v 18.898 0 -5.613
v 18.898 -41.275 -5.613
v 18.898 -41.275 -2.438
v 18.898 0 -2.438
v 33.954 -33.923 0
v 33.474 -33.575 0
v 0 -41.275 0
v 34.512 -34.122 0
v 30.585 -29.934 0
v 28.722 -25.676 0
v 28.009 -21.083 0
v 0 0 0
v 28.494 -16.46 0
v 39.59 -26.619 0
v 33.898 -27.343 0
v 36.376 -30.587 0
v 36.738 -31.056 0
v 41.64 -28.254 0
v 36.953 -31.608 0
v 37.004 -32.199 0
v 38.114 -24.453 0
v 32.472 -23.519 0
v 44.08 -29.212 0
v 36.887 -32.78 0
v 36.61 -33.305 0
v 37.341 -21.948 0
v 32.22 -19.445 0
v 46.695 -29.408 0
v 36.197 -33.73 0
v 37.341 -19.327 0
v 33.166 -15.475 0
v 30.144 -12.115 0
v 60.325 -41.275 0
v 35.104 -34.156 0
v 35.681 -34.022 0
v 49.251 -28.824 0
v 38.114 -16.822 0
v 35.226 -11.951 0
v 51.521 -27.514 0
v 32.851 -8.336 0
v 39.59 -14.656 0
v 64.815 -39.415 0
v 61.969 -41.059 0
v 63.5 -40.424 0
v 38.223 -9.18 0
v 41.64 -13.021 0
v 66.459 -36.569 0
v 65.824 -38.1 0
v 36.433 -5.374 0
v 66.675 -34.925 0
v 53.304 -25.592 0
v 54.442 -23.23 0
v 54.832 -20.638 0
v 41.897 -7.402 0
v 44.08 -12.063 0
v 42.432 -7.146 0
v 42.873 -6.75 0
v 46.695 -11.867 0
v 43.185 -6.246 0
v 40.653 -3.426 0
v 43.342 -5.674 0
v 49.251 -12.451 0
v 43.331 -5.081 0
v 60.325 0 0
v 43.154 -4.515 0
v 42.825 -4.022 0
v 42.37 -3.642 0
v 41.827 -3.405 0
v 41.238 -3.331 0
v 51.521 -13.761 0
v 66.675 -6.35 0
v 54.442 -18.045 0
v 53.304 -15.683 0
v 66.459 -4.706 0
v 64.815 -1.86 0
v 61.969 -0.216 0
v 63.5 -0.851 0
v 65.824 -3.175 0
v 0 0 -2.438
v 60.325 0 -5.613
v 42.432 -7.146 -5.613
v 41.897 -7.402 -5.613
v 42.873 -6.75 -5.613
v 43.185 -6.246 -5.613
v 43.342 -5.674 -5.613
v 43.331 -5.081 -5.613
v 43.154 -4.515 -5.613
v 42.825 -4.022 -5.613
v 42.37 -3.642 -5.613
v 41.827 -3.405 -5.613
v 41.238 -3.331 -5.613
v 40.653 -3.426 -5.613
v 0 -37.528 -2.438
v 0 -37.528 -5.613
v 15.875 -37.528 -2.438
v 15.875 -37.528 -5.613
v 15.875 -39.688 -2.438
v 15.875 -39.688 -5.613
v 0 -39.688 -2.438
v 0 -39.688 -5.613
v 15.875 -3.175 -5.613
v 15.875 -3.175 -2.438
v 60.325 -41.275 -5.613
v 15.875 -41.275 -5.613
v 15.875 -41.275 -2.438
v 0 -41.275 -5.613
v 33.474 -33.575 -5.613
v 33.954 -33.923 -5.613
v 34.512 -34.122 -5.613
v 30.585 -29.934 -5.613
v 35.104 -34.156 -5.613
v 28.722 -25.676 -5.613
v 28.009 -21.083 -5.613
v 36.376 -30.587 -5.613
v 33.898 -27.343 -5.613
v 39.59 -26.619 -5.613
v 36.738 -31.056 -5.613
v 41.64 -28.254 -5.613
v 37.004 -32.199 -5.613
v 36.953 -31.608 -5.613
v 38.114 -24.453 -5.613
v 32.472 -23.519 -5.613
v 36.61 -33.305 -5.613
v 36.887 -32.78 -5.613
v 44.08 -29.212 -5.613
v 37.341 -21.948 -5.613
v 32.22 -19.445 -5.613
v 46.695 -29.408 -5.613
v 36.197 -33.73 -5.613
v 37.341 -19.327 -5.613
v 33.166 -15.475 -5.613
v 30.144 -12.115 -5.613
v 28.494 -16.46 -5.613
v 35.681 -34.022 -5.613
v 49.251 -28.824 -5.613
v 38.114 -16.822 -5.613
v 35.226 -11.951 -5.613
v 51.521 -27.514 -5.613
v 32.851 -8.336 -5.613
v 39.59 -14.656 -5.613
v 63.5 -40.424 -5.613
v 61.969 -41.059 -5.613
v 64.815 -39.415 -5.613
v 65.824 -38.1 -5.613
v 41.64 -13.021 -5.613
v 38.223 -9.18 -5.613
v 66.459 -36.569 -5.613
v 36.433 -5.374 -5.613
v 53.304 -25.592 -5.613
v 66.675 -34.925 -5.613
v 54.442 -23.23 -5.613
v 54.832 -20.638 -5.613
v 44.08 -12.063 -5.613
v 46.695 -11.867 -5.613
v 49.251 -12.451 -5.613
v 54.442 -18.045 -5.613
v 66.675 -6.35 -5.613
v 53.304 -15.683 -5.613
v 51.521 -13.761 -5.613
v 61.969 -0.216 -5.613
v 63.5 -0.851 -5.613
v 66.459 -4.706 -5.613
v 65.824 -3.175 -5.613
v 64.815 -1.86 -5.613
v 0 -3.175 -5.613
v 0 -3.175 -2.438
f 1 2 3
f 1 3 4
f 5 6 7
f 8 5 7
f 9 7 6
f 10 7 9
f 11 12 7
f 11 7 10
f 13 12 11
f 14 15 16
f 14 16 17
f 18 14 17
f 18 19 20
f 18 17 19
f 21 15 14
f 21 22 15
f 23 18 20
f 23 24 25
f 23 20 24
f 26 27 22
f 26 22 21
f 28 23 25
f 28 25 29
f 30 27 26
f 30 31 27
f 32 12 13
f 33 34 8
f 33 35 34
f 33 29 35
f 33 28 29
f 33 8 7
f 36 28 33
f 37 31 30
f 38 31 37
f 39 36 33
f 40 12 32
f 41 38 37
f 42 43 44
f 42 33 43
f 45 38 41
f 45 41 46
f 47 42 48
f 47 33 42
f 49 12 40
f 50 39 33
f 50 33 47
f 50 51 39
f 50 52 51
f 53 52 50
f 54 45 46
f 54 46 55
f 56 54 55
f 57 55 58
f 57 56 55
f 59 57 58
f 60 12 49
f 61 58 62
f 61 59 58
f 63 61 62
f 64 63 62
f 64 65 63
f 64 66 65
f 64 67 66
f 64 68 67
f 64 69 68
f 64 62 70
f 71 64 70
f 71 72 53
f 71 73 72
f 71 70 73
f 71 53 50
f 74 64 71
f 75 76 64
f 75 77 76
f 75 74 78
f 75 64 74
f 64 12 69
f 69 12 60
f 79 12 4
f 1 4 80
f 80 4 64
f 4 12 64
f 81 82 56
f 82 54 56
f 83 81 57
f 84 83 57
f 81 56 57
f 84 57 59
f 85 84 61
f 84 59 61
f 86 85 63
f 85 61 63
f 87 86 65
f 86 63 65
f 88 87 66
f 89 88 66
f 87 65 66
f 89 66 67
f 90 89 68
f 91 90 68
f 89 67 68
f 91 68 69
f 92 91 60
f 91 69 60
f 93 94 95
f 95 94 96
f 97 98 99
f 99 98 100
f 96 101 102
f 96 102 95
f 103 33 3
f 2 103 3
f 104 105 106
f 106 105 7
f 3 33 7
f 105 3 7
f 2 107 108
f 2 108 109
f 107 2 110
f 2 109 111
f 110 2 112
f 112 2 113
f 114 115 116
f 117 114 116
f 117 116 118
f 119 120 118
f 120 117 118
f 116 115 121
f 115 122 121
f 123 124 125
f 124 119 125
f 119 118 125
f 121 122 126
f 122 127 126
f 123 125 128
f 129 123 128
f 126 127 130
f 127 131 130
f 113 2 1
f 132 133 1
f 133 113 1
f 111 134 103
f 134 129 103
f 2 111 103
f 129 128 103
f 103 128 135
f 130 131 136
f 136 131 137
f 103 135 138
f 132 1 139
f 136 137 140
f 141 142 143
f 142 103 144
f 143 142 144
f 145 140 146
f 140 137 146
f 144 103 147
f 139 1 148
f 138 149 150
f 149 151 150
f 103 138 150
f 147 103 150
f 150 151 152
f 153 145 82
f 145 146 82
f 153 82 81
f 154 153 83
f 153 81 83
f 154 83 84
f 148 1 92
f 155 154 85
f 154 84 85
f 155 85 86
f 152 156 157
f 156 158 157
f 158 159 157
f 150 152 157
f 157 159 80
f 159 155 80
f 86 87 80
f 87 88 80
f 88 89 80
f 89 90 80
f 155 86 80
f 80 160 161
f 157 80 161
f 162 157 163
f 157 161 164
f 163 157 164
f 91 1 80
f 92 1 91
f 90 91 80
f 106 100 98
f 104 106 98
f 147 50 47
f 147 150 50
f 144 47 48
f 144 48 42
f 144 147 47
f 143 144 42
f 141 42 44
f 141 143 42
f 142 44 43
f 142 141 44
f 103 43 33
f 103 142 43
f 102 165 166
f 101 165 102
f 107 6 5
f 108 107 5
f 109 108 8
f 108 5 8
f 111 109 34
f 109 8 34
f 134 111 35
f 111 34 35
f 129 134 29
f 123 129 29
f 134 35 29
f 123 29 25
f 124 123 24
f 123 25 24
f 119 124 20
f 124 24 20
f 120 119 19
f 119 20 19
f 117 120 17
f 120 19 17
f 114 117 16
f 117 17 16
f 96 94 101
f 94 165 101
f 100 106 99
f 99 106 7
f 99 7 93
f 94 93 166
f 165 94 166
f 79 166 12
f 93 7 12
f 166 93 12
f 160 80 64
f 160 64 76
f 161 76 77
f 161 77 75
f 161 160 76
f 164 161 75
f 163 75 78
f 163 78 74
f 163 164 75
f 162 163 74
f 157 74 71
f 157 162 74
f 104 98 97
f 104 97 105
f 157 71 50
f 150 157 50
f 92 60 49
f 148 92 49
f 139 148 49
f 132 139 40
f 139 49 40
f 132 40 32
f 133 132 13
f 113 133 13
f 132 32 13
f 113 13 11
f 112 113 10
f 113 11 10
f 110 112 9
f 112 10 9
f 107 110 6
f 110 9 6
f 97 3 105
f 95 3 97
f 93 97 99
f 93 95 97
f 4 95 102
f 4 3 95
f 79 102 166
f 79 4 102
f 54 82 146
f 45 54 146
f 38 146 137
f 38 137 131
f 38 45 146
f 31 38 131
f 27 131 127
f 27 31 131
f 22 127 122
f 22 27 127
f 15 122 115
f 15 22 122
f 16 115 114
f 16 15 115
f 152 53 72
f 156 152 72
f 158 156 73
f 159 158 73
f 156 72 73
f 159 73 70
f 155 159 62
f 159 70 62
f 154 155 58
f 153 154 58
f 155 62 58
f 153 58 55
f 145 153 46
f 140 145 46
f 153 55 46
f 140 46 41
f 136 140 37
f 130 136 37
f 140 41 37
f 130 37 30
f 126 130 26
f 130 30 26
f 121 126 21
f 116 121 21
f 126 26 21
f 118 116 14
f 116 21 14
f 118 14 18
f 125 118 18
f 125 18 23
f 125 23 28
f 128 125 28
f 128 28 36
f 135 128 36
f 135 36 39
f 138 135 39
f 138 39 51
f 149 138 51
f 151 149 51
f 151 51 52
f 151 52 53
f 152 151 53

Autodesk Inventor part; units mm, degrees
ref_plane "YZ Plane" through (0, 0, 0) normal (1, 0, 0) x (0, 1, 0)
ref_plane "XZ Plane" through (0, 0, 0) normal (0, 1, 0) x (-1, 0, 0)
ref_plane "XY Plane" through (0, 0, 0) normal (0, 0, 1) x (1, 0, 0)
sketch "Sketch1" plane through (0, 0, 0) normal (0, 0, 1) x (1, 0, 0)
  line L0 (0, 0) -> (66.675, 0)
  line L1 (66.675, 0) -> (66.675, -41.275)
  line L2 (66.675, -41.275) -> (0, -41.275)
  line L3 (0, -41.275) -> (0, 0)
  arc A0 (40.6531, -3.4261) -> (33.474, -33.5752) centre (46.0375, -20.6375) ccw
  arc A1 (41.8969, -7.4017) -> (36.376, -30.5868) centre (46.0375, -20.6375) ccw
  circle A2 centre (46.0375, -20.6375) radius 8.7948
  arc A3 (41.8969, -7.4017) -> (40.6531, -3.4261) centre (41.275, -5.4139) ccw
  arc A4 (33.474, -33.5752) -> (36.376, -30.5868) centre (34.925, -32.081) ccw
  dimension "d0" = 41.275
  dimension "d1" = 66.675
  dimension "d4" = 17.5895
  dimension "d5" = 20.6375
  dimension "d22" = 20.6375
  dimension "d23" = 25.4
  dimension "d24" = 31.75
  dimension "d54" = 2.0828
  dimension "d55" = 15.9512
extrude "Extrusion1" add sketch "Sketch1" against normal blind 5.6134
sketch "Sketch5" plane through (0, 0, -5.6134) normal (0, 0, -1) x (-1, 0, 0)
  line L0 (0, 0) -> (-66.675, 0) projected
  line L1 (-66.675, -41.275) -> (0, -41.275) projected
  line L2 (0, -41.275) -> (0, 0) projected
  line L3 (-18.8976, 0) -> (-15.875, 0)
  line L4 (-15.875, 0) -> (-15.875, -41.275)
  line L5 (-15.875, -41.275) -> (-18.8976, -41.275)
  line L6 (-18.8976, -41.275) -> (-18.8976, 0)
  line L7 (-18.8976, 0) -> (0, 0)
  line L8 (0, 0) -> (0, -3.175)
  line L9 (0, -3.175) -> (-18.8976, -3.175)
  line L10 (-18.8976, -3.175) -> (-18.8976, 0)
  line L11 (-15.875, -39.6875) -> (0, -39.6875)
  line L12 (0, -39.6875) -> (0, -37.5285)
  line L13 (0, -37.5285) -> (-15.875, -37.5285)
  line L14 (-15.875, -37.5285) -> (-15.875, -39.6875)
  dimension "d37" = 3.0226
  dimension "d38" = 15.875
  dimension "d39" = 3.175
  dimension "d43" = 1.5875
  dimension "d44" = 2.159
extrude "Extrusion5" cut sketch "Sketch5" against normal blind 3.175 contours L2 L9 L4 L0 | L4 L9 L6 L0 | L4 L1 L6 L9 | L2 L11 L4 L13
fillet "Fillet1" radius 6.35 2 edges at (66.675, 0, -2.8067) (66.675, -41.275, -2.8067)
properties part number "Lidar Sensor Case v4 Piece 3"
